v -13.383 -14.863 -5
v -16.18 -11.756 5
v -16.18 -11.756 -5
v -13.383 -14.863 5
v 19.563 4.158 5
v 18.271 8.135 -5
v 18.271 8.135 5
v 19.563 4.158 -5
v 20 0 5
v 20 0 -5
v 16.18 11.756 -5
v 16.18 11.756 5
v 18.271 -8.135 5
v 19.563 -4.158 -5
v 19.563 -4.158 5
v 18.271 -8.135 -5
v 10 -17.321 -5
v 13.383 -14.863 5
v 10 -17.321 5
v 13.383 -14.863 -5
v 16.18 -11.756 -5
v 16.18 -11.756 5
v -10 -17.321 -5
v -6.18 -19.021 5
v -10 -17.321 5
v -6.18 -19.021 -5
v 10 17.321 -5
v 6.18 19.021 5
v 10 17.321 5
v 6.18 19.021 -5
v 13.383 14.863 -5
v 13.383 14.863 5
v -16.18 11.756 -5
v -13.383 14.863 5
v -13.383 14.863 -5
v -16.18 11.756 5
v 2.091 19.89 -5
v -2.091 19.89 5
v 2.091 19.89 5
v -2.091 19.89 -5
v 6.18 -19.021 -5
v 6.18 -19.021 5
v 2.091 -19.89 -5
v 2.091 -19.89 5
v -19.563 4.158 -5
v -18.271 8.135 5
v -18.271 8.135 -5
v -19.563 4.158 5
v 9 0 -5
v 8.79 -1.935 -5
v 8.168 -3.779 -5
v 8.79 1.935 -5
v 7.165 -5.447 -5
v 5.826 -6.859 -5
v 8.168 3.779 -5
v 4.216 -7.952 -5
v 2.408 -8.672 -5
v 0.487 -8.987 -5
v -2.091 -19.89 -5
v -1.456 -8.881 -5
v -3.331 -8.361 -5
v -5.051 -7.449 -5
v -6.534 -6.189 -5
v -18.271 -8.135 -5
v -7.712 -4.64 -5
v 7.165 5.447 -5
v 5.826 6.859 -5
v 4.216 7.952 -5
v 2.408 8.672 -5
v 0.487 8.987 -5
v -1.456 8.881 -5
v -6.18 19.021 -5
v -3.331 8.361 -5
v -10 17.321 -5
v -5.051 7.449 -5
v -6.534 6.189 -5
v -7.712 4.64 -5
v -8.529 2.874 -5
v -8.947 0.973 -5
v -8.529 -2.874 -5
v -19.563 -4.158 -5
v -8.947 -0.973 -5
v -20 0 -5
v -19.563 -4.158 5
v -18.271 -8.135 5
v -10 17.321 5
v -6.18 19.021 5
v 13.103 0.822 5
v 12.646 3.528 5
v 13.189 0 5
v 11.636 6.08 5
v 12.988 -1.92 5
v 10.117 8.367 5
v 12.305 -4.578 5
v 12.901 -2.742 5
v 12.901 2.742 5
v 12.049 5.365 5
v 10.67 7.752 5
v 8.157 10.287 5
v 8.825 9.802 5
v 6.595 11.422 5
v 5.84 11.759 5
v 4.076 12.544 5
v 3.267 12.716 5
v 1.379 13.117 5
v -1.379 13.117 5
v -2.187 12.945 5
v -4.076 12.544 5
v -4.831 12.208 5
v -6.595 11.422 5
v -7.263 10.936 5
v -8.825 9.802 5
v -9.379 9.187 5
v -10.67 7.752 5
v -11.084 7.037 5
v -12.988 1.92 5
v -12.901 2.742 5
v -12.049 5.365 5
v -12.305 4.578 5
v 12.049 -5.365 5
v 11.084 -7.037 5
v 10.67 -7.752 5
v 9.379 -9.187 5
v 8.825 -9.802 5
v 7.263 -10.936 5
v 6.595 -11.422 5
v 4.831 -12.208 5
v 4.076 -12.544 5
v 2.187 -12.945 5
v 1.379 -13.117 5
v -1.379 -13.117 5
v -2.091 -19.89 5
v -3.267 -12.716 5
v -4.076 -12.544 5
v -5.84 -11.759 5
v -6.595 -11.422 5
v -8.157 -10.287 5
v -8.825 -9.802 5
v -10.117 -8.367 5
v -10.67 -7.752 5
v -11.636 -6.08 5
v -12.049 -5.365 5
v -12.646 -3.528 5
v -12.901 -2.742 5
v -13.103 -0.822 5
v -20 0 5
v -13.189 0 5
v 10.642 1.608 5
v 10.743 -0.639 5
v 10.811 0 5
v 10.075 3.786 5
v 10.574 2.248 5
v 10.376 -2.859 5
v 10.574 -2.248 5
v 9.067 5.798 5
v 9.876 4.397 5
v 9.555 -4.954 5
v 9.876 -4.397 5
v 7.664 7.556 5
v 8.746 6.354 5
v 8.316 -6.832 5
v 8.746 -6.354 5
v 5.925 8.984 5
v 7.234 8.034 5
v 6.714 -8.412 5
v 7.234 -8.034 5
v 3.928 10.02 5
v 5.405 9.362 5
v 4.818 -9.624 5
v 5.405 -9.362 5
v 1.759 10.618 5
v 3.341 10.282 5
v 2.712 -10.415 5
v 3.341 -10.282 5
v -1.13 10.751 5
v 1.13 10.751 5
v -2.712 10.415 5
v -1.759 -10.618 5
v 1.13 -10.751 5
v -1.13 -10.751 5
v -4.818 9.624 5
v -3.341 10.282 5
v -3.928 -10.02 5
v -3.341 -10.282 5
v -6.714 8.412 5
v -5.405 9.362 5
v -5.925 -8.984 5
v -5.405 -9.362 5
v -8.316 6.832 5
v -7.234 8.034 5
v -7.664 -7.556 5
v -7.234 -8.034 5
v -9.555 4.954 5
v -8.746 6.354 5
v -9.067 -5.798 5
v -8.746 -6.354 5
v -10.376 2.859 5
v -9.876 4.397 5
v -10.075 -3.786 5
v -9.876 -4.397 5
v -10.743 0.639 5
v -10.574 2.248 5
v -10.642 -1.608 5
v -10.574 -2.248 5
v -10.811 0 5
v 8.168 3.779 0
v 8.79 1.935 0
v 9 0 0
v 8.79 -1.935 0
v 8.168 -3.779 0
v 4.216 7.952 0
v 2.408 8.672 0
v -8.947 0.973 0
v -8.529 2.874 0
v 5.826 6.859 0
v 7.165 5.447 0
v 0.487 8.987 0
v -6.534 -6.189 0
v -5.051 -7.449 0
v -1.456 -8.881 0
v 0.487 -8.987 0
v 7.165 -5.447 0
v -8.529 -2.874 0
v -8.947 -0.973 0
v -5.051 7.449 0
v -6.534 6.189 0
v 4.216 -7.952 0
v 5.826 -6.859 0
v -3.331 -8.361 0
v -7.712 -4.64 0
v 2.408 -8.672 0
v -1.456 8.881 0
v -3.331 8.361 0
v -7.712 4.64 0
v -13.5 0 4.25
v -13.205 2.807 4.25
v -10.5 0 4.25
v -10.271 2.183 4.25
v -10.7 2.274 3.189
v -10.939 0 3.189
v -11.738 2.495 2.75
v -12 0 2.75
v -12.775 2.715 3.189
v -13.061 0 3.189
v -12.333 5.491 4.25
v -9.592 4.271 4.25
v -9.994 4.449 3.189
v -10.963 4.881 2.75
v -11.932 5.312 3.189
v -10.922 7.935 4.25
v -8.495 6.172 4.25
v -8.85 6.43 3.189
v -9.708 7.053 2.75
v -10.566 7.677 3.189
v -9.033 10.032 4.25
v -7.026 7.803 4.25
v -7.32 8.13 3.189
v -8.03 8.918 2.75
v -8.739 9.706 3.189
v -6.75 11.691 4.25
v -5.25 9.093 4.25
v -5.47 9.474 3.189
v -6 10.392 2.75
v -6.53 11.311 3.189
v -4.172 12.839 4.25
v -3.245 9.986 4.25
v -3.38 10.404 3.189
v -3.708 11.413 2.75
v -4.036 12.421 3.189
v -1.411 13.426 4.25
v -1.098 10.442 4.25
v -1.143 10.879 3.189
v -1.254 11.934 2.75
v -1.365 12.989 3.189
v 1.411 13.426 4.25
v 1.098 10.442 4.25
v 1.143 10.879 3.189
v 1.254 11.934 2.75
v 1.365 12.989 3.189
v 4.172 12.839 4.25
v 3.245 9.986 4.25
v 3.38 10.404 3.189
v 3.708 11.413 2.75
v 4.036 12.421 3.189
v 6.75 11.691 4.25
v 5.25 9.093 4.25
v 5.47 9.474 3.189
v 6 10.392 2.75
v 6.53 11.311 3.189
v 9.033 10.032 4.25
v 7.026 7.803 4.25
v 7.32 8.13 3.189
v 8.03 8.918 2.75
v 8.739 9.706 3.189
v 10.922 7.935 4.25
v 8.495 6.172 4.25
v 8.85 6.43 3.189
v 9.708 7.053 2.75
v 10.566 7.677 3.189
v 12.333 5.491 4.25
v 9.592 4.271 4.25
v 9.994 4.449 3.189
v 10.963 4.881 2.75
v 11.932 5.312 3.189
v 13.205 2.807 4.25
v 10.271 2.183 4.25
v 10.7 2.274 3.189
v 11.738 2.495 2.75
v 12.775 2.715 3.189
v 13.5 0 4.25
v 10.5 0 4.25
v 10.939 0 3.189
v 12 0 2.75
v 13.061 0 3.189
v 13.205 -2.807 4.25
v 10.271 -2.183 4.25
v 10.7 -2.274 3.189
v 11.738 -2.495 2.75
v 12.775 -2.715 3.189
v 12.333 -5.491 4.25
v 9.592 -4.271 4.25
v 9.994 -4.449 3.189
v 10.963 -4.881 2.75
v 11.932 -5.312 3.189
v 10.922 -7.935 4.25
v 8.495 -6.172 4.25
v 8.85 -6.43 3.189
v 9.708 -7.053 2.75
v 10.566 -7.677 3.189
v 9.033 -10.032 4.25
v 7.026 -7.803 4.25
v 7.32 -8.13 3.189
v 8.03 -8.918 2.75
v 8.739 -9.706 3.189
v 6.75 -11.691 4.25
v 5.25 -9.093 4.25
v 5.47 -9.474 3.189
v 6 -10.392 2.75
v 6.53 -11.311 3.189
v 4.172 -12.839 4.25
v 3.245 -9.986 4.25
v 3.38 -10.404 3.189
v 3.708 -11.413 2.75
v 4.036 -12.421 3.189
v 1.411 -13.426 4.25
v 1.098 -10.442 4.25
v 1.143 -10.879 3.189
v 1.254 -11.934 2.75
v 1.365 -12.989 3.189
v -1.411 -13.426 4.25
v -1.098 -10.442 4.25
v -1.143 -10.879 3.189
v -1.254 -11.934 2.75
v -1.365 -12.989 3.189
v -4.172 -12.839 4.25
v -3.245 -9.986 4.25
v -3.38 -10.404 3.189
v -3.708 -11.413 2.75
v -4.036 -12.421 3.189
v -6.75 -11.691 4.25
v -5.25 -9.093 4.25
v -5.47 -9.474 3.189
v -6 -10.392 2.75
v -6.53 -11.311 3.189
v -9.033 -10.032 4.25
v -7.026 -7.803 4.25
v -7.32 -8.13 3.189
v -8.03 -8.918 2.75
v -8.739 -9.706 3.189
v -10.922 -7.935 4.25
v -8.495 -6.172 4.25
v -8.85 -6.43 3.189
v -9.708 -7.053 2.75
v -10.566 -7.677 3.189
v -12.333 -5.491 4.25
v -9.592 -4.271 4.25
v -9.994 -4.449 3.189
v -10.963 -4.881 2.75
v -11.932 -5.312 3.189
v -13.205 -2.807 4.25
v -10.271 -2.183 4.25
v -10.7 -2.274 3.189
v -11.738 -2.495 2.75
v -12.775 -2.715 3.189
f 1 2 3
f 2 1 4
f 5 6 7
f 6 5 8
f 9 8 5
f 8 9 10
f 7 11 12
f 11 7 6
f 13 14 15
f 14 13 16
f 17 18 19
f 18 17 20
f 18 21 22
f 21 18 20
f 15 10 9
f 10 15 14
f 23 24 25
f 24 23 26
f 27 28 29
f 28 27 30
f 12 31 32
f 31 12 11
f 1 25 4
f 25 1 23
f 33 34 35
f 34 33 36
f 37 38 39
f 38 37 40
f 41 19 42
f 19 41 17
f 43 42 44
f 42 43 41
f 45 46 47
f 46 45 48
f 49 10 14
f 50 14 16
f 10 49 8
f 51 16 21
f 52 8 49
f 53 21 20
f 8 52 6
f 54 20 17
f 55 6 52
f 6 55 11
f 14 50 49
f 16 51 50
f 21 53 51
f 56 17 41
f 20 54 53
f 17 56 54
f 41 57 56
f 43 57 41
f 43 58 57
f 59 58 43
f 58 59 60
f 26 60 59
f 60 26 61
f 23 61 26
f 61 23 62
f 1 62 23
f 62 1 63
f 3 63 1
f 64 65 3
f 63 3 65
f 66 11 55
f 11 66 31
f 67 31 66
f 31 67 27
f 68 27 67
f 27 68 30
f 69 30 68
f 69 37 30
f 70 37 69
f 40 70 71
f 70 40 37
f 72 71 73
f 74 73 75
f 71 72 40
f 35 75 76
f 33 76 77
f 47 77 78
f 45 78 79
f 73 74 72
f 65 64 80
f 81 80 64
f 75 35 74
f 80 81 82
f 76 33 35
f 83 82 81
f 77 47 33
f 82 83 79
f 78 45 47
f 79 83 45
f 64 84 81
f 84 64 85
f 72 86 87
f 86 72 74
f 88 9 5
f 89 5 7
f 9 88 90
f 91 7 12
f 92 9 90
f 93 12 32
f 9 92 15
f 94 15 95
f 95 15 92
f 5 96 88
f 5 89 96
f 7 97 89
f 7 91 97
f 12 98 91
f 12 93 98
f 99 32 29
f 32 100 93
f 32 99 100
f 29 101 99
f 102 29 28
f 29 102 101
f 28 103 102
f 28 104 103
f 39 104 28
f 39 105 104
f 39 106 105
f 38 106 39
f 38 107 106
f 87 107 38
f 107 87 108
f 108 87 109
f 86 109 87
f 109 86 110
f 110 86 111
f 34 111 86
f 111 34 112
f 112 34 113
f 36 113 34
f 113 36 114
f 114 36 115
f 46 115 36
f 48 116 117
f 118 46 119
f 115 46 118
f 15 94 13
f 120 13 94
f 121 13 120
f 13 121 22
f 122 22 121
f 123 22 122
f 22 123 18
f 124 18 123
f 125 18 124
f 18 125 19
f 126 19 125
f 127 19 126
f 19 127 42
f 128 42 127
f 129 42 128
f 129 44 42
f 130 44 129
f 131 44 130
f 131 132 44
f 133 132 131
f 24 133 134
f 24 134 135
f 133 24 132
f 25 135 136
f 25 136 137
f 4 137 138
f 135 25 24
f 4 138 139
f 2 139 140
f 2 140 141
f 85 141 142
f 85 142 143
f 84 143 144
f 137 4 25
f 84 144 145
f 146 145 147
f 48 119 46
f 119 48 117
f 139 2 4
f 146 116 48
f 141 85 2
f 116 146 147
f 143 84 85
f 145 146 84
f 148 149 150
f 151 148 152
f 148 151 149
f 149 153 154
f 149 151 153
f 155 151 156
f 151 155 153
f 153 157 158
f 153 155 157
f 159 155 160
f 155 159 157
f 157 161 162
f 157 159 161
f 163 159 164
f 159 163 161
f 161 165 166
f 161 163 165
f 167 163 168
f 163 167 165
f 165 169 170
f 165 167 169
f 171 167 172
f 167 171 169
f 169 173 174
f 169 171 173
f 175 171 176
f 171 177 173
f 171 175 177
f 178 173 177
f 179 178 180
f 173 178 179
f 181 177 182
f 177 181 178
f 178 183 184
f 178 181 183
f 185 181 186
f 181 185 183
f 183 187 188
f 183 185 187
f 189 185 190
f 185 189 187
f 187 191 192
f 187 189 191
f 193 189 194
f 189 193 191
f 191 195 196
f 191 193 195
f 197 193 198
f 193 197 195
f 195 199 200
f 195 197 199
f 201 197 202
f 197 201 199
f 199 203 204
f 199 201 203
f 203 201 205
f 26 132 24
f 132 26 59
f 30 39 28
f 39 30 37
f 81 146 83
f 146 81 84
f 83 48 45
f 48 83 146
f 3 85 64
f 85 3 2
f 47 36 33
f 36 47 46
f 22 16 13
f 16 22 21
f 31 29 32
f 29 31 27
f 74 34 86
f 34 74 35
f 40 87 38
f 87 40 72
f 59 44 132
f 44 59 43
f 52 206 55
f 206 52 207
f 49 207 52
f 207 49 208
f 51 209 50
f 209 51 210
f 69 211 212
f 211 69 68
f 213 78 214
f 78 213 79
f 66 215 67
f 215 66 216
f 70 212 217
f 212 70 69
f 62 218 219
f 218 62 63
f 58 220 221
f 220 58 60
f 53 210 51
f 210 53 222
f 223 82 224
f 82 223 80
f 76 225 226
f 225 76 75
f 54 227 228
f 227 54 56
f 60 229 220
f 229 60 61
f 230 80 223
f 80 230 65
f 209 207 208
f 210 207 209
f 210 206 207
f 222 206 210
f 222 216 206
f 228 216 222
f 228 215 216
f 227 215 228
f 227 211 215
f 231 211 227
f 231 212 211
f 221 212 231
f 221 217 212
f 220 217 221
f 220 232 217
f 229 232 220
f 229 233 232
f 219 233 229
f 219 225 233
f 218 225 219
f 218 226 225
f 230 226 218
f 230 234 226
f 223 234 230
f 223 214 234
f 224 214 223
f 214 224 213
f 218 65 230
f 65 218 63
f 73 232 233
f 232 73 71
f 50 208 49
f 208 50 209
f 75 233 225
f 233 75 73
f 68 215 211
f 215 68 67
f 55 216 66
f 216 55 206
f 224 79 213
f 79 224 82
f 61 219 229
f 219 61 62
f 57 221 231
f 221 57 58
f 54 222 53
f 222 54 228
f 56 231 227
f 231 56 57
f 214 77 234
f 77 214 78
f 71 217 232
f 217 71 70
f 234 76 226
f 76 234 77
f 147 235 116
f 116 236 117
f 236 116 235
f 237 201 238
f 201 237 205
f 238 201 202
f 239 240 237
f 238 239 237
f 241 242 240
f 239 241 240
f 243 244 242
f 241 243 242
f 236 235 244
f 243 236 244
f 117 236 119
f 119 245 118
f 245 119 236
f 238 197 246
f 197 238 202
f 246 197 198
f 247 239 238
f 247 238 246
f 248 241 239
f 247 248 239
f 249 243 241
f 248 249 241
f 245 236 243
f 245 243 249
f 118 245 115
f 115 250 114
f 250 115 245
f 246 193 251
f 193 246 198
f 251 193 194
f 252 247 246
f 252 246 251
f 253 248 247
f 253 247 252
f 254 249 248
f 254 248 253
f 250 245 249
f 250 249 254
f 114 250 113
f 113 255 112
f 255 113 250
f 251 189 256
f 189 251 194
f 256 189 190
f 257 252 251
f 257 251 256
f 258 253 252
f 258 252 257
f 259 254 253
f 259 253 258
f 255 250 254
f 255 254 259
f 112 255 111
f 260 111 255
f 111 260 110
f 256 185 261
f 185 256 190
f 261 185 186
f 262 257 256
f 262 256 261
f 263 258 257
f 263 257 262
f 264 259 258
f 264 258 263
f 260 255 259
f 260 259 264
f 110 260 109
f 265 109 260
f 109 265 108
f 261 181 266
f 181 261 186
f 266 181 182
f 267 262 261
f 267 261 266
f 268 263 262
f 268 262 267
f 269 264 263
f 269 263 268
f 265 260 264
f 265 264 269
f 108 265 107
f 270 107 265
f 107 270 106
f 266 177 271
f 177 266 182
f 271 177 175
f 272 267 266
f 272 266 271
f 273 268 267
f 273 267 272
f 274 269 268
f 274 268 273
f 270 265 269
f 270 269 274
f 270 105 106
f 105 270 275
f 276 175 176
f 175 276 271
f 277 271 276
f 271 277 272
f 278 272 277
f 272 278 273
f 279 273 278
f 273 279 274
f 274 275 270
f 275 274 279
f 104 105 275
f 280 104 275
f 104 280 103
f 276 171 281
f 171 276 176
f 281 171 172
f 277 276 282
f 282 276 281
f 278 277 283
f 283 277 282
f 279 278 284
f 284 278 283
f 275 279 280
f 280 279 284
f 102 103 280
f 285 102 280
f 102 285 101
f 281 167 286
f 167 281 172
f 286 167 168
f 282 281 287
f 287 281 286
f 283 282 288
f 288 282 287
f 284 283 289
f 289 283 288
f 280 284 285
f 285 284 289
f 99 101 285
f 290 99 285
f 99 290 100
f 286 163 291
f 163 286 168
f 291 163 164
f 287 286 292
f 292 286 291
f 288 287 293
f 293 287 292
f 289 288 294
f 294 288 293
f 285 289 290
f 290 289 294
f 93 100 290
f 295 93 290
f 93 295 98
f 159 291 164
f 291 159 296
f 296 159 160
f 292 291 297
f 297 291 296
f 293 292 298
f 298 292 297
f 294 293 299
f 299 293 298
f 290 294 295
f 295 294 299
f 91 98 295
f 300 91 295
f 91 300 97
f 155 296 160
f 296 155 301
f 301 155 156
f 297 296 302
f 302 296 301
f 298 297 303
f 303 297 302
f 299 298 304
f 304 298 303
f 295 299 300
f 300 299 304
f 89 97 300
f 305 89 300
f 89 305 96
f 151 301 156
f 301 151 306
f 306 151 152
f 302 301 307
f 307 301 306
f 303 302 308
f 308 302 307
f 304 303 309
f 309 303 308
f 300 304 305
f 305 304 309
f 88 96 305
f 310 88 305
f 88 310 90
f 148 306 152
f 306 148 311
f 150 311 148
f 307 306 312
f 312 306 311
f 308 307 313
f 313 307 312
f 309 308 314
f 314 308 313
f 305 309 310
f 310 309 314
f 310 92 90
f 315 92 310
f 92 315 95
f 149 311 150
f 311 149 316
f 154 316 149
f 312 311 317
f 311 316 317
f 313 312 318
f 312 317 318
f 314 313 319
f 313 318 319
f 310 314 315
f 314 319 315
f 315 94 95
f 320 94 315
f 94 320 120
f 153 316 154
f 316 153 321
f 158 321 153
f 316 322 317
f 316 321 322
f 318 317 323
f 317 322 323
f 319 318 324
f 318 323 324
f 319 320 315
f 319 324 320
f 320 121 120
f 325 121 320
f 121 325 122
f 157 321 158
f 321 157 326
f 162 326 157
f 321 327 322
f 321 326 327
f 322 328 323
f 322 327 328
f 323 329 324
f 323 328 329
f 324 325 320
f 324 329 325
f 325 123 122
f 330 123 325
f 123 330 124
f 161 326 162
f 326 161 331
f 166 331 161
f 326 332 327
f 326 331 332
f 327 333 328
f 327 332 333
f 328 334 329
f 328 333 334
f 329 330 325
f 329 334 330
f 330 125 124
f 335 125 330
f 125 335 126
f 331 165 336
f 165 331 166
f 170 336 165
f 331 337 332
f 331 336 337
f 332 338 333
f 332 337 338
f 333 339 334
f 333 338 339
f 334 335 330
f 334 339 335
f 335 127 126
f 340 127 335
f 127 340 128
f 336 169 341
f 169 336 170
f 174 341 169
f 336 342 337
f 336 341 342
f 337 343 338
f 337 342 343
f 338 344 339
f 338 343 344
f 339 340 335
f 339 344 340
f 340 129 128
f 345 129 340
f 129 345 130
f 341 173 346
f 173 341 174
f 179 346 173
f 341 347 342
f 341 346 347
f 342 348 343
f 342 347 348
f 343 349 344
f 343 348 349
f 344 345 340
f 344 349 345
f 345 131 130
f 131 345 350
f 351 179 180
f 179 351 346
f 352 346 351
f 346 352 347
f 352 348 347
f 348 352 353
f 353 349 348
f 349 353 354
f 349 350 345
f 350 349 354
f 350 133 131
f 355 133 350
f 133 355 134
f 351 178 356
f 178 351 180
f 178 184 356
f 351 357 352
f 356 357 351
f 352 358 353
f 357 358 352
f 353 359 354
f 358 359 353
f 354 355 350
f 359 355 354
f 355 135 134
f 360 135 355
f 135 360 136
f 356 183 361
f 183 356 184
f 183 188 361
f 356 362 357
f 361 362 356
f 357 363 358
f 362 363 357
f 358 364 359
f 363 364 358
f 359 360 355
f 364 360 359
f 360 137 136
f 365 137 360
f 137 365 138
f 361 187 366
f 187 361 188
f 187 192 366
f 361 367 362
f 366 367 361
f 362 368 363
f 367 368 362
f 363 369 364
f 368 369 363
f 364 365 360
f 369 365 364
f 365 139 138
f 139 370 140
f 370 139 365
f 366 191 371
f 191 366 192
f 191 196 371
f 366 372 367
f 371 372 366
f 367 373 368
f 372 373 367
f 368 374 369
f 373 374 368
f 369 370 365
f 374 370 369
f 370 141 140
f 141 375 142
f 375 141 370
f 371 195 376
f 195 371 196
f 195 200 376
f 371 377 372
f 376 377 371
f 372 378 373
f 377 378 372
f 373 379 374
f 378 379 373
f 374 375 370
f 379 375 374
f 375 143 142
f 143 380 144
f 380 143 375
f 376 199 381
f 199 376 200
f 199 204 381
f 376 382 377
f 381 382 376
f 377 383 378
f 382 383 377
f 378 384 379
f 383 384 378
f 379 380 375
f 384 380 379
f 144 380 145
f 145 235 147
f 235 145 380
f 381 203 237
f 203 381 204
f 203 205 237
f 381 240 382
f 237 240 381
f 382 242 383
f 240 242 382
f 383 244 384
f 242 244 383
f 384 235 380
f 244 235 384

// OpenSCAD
//--------------------------------------------------------------
//-- Parametric table foot
//-- The foot consist of two three parts: a cylindrical body, a hole on the top,
//--   and the O-ring on the bottom
//--------------------------------------------------------------
//-- (c) Juan Gonzalez-Gomez (Obijuan) juan@iearobotics.com
//--  Nov-2012
//---------------------------------------------------------------
//-- GPL license
//---------------------------------------------------------------

//------- User parameters

//-- Foot body
foot_diam = 40;       //-- Foot diameter
foot_hi   = 10;       //-- Foot height


//-- Top hole (optional)
top_hole_diam = 18;   //-- Diameter of the top hole (0 if not needed)
top_hole_depth = 5;

//-- Bottom O-ring
oring_idiam = 21;       //-- O-ring internal diameter
oring_diam = 3;         //-- O-ring section diameter

//-- Lenght of the top hole
temp_hi = top_hole_depth + 20;


difference() {

  //-- Foot body
  cylinder(r = foot_diam/2, h = foot_hi, center=true);

  //-- Top hole
  translate([0, 0, -temp_hi/2 - foot_hi/2 + top_hole_depth])
    cylinder(r = top_hole_diam/2, h = top_hole_depth+20, center = true);

  //-- Bottom O-ring 
  translate([0,0, foot_hi/2-oring_diam/4])
    rotate_extrude($fn=30)
     translate([oring_idiam/2 + oring_diam/2,0,0])
     circle(r = oring_diam/2, center=true, $fn=8);
}
